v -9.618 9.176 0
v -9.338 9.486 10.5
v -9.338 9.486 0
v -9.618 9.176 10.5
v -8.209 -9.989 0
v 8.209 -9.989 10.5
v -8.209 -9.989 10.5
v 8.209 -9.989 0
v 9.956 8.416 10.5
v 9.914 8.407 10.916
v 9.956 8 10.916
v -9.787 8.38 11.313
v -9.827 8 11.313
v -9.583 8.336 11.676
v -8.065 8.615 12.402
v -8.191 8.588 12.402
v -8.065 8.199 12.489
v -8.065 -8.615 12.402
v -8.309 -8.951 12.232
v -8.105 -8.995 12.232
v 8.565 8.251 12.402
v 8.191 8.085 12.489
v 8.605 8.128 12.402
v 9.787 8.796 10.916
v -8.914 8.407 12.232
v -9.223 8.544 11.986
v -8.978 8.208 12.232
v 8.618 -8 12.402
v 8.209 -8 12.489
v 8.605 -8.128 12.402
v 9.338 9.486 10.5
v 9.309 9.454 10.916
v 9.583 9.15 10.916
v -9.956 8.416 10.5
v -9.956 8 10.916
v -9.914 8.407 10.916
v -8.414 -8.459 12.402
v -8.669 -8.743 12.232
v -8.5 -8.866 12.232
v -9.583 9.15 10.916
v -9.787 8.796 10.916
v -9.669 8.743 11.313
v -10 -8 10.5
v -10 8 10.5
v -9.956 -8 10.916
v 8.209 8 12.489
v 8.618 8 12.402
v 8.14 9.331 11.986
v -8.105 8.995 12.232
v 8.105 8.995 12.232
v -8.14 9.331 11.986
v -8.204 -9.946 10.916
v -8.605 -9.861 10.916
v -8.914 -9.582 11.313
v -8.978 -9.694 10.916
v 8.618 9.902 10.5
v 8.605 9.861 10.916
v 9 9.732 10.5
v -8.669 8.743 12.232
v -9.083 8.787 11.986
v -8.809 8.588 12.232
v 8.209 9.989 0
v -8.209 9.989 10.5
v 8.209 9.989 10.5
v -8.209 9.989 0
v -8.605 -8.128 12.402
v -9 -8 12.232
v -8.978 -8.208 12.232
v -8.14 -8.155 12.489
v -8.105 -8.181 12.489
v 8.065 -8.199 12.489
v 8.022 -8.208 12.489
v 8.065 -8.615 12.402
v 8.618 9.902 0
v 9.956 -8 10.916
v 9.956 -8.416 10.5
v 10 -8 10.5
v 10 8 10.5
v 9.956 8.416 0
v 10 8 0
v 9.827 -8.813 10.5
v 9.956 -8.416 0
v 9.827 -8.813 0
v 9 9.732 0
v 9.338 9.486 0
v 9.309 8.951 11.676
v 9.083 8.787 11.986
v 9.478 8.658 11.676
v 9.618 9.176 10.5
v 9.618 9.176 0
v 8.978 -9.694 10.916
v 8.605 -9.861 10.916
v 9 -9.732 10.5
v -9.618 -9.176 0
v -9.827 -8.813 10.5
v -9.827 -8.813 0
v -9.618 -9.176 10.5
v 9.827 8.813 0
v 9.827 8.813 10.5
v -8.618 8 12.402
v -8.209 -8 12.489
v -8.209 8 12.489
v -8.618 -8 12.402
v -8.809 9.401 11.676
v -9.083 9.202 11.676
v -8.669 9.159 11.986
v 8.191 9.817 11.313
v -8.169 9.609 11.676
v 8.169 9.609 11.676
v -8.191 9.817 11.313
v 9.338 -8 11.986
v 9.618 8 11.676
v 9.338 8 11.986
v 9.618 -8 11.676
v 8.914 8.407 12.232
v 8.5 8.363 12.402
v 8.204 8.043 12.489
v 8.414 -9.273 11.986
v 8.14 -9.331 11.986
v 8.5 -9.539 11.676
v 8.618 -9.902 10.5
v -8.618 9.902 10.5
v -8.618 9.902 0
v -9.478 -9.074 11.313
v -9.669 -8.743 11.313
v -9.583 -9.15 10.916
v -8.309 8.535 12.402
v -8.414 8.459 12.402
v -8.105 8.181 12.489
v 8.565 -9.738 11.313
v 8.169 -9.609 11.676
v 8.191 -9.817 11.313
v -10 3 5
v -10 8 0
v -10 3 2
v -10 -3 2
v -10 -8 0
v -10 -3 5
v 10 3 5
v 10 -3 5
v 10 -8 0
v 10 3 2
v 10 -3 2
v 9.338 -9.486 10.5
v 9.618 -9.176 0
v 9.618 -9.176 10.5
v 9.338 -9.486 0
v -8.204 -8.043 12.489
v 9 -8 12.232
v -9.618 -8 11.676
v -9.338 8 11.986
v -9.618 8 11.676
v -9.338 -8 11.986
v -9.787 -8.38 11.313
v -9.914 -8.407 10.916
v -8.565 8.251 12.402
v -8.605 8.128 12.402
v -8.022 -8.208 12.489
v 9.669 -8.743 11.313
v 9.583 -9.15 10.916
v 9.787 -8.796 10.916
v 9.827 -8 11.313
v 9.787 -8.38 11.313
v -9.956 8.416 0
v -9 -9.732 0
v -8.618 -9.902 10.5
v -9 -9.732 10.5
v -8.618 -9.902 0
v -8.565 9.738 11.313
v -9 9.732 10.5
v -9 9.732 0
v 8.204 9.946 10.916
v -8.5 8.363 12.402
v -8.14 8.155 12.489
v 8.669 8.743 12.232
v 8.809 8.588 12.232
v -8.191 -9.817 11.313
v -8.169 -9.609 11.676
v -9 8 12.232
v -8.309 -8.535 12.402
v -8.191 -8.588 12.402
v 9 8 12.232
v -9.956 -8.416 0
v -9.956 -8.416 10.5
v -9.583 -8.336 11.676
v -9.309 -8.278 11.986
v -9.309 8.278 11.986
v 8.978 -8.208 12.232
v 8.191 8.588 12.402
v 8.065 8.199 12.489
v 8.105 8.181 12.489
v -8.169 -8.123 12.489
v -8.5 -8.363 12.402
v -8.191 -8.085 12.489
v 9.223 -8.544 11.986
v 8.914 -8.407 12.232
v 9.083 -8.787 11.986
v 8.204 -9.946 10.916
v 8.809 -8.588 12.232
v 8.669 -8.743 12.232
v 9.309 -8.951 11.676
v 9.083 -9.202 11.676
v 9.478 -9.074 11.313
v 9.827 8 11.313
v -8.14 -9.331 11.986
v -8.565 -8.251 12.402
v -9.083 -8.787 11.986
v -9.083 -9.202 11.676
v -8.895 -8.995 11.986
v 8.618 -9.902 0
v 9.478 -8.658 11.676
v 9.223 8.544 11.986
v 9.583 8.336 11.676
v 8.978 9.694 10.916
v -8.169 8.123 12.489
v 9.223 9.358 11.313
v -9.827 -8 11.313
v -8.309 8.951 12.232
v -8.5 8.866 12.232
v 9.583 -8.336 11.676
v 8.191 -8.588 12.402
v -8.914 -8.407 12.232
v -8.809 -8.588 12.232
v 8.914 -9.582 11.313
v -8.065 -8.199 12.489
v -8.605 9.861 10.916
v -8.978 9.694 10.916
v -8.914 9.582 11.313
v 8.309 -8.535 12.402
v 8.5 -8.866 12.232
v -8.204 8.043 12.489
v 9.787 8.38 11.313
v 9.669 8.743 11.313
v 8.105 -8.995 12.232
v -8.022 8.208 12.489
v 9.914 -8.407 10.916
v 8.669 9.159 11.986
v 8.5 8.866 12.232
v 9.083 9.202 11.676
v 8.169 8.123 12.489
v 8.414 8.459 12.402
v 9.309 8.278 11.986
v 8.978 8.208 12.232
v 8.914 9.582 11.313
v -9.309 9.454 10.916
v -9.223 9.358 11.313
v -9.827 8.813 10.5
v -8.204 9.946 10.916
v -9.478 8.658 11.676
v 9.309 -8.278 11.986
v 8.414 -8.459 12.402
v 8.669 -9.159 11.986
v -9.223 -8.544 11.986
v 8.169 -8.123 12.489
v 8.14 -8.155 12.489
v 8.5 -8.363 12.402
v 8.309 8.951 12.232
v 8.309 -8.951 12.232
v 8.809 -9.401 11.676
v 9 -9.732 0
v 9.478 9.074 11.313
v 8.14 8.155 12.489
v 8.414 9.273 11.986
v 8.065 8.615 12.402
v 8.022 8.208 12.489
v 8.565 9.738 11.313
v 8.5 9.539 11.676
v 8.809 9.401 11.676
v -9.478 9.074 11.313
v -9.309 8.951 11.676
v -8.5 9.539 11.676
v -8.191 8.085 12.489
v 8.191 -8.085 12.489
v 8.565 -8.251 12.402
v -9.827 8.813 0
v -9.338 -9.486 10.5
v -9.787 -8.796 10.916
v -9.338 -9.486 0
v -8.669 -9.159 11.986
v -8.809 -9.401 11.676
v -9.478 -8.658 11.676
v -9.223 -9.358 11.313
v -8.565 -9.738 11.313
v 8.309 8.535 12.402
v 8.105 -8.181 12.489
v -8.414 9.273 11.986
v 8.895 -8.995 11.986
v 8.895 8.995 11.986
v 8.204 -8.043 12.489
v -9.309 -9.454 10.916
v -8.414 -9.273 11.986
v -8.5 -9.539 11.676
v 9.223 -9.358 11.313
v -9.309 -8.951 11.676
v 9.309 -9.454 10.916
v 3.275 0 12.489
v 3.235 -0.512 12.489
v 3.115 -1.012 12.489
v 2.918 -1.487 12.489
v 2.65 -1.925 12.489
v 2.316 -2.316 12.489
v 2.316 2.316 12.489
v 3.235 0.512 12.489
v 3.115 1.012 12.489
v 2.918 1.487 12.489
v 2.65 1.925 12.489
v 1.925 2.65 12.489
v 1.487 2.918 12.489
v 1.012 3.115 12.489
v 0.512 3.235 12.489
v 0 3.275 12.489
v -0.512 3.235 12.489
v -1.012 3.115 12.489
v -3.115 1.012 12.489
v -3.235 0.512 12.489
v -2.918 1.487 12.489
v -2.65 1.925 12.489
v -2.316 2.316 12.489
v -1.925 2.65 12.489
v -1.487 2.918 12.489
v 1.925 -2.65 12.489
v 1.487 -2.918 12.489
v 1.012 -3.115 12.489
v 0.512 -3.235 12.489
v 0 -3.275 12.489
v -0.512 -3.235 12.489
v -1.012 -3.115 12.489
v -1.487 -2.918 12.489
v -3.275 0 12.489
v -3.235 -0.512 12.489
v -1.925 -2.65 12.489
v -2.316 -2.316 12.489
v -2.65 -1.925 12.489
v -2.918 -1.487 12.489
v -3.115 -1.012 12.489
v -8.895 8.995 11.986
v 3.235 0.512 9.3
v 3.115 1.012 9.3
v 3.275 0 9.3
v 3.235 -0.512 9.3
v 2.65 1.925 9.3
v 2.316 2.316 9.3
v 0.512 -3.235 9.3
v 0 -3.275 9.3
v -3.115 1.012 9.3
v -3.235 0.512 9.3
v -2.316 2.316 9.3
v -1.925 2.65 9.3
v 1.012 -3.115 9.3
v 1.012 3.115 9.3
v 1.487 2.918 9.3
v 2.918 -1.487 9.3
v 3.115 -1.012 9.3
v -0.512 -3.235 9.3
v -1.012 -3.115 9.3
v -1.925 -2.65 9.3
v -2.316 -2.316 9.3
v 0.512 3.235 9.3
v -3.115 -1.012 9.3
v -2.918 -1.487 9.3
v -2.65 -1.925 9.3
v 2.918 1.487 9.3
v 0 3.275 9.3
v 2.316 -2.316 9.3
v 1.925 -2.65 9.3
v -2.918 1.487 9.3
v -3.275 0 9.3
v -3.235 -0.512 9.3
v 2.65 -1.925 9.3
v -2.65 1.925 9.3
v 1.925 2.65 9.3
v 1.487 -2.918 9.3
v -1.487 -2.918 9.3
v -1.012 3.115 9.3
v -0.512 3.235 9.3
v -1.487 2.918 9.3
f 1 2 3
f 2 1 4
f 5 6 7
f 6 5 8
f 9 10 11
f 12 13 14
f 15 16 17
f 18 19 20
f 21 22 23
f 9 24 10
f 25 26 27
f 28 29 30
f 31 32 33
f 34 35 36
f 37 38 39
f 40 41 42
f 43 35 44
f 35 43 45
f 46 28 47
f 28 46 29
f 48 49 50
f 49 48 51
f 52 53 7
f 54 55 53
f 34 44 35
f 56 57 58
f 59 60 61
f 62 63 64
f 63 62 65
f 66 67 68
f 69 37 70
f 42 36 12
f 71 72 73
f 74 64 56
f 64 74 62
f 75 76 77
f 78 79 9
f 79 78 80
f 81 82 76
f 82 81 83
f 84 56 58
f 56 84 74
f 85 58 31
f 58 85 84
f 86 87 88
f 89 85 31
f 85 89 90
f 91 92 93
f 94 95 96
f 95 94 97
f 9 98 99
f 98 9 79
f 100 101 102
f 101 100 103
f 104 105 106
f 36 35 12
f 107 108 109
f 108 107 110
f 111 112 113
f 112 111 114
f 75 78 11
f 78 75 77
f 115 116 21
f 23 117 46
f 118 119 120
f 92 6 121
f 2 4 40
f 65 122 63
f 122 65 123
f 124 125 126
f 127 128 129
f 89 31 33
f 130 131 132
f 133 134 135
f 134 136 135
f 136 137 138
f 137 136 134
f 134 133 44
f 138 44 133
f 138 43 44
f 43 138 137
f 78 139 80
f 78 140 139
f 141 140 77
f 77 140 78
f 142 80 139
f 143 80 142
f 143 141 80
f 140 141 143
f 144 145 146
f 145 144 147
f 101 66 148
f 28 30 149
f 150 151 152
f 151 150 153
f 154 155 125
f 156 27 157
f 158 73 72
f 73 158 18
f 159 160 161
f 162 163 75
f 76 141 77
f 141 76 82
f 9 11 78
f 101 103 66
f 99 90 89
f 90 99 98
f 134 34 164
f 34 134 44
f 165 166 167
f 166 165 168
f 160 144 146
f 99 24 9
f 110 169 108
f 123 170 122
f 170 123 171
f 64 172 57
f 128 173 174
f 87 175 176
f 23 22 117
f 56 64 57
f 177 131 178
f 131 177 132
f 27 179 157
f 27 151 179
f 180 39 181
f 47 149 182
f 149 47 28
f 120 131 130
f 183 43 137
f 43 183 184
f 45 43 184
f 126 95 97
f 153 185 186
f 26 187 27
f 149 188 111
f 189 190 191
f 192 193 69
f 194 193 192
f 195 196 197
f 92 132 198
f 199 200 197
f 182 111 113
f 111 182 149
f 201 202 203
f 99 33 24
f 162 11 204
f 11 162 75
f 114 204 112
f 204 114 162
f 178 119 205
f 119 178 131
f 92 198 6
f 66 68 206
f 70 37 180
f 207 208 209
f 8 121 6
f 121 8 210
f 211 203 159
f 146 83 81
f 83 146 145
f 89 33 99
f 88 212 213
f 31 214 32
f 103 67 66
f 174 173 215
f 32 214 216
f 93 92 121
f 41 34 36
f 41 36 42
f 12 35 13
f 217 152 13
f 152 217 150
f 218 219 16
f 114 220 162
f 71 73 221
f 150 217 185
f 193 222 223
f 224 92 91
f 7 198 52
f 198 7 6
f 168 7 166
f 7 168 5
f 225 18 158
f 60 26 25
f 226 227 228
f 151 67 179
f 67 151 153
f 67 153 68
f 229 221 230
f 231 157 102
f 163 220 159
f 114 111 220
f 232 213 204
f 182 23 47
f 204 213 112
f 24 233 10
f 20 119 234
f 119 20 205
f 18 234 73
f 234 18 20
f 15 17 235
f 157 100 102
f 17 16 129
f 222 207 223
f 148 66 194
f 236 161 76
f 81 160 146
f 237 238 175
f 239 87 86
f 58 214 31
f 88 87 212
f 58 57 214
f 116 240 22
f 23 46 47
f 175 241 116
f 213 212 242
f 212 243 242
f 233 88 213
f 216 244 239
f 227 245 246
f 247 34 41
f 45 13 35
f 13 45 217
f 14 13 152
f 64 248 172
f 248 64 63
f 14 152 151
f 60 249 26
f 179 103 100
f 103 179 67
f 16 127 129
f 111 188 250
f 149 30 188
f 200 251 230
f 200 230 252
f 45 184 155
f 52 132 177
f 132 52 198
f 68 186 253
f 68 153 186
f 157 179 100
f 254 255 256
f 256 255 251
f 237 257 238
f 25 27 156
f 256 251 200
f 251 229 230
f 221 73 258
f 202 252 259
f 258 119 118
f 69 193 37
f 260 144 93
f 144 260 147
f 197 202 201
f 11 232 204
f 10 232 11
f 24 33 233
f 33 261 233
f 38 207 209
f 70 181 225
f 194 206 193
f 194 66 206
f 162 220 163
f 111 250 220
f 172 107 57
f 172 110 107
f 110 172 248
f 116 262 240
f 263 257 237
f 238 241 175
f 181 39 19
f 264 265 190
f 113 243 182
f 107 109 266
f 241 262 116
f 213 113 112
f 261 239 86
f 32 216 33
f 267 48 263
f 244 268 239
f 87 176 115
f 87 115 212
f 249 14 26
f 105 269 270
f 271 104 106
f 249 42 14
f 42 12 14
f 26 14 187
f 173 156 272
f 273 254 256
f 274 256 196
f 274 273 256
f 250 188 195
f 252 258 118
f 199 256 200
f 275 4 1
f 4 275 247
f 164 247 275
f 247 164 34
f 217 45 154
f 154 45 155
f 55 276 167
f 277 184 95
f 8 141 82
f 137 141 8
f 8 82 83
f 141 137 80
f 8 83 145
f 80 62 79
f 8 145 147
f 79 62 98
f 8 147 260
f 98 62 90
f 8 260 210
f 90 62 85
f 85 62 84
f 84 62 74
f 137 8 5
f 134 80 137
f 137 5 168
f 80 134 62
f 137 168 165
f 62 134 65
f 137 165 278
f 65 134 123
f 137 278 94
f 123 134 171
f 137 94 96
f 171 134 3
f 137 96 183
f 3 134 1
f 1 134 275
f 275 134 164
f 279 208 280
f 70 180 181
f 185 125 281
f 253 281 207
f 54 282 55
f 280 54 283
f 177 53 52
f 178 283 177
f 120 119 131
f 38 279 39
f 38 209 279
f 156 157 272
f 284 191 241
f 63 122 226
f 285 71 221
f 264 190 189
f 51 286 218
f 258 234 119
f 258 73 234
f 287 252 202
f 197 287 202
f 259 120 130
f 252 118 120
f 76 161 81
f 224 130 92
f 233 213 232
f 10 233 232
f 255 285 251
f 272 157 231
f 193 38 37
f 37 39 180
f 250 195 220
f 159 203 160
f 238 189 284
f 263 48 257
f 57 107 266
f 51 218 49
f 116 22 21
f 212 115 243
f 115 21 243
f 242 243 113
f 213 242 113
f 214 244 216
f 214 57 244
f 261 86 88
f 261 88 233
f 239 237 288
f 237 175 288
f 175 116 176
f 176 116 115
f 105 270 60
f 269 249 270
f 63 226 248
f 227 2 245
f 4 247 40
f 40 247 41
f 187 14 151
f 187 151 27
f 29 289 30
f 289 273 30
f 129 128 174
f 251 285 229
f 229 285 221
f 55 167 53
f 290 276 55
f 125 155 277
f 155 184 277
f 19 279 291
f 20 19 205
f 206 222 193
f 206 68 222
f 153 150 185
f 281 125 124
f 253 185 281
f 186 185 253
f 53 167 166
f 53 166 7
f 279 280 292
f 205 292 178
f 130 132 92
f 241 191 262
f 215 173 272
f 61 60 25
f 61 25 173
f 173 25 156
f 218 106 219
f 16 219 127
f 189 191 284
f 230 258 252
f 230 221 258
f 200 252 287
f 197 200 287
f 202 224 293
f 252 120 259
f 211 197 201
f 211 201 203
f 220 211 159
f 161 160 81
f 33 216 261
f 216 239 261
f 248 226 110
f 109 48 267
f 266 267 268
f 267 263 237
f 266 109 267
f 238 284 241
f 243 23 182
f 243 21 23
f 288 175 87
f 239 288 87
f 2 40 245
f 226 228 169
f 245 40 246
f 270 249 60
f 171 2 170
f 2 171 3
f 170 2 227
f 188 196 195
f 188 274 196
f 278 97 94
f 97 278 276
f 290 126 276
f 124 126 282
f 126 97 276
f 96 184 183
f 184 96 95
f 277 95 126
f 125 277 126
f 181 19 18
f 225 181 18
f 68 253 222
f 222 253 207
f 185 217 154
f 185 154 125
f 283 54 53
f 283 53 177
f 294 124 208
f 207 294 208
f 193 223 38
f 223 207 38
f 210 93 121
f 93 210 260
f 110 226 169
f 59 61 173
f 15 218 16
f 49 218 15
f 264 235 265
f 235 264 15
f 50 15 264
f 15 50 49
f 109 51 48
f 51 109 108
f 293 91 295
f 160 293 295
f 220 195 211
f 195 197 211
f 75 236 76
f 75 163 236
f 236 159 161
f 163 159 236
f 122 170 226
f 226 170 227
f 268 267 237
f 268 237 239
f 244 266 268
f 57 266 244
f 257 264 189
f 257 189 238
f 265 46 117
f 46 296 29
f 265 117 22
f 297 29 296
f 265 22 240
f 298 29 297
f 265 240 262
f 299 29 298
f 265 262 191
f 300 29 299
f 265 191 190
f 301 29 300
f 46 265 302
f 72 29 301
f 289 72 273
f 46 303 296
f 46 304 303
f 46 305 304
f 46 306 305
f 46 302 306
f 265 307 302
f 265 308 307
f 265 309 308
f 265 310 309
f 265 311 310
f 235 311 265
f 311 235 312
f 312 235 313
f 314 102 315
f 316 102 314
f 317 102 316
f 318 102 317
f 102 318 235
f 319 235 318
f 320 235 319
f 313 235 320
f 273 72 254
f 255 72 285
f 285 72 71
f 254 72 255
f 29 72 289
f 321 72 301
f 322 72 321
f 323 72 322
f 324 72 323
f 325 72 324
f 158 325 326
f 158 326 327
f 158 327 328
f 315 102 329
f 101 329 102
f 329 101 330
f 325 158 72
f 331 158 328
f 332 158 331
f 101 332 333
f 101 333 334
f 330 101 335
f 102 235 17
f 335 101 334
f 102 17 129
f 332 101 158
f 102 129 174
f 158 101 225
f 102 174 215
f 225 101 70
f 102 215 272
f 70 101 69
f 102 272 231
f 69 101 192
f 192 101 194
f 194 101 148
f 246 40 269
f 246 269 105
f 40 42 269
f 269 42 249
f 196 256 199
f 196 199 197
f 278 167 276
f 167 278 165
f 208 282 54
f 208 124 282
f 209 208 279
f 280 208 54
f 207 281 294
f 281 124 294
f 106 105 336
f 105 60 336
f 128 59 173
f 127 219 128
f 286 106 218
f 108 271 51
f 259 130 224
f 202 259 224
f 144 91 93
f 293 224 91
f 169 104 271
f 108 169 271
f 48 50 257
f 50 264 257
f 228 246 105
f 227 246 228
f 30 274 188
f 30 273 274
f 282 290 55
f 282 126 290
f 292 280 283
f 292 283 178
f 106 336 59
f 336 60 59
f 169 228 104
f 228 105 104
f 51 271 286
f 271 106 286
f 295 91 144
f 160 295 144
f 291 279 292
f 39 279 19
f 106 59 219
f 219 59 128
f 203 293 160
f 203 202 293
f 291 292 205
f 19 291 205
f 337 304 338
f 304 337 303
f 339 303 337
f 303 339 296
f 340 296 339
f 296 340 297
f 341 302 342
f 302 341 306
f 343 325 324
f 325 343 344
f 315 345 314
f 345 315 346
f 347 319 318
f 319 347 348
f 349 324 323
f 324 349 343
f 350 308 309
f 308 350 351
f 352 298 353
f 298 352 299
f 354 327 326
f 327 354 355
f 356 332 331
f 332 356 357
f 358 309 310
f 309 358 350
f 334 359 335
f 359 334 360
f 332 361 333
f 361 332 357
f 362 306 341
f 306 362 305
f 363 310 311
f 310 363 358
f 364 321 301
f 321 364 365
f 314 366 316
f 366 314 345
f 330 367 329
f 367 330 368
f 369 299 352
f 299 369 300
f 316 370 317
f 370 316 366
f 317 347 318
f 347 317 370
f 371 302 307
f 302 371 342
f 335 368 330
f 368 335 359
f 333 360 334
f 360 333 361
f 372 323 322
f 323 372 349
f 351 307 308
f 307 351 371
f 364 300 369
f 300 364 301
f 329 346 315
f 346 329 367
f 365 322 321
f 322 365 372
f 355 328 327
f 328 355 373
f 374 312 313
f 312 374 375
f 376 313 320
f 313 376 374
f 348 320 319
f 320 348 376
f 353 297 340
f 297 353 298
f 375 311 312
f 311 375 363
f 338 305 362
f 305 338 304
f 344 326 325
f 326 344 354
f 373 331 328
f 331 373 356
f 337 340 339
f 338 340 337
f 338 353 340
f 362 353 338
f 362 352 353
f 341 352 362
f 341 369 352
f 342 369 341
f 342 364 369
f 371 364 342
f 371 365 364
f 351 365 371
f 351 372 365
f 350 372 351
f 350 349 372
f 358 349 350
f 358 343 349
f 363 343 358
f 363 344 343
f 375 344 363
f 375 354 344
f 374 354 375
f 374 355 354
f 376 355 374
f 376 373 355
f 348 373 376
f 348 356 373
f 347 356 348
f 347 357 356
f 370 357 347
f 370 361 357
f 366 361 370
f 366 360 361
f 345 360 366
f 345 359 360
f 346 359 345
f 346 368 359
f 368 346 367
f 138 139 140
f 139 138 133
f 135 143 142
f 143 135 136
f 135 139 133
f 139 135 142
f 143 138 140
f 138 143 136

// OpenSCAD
//distance between inside of crank and surface of magnet.
crank_offset=12.5;
//diameter of magnet in mm.  Add about 0.2mm extra to ensure a tigth but not impossible fit.
magnet_diameter=6.55;
//height of magnet in mm
magnet_height=3.2;


difference() {
	translate([-10,-10])
	  v_rounded_cube([20,20,crank_offset],2);
	//magnet hole
	translate([0,0,crank_offset-magnet_height ])
		cylinder(h=magnet_height,d=magnet_diameter,$fn=40);
	//cabletie hole
	translate([-50,-3 ,2 ]) cube([100,6,3]);
}
module v_rounded_cube(xyz,r,$fn=30) {
	z = xyz[2];
	y = xyz[1];
	x = xyz[0];
	translate([r,r])
	hull() {
		cylinder(h=z-r,r=r);
		translate([0,y-2*r])
		cylinder(h=z-r,r=r);
		translate([x-2*r,0])
		cylinder(h=z-r,r=r);
		translate([x-2*r,y-2*r])
		cylinder(h=z-r,r=r);
		translate([0,0,z-r])
		sphere(r);
		translate([0,y-2*r,z-r])
		sphere(r);
		translate([x-2*r,0,z-r])
		sphere(r);
		translate([x-2*r,y-2*r,z-r])
		sphere(r);
	}
}
